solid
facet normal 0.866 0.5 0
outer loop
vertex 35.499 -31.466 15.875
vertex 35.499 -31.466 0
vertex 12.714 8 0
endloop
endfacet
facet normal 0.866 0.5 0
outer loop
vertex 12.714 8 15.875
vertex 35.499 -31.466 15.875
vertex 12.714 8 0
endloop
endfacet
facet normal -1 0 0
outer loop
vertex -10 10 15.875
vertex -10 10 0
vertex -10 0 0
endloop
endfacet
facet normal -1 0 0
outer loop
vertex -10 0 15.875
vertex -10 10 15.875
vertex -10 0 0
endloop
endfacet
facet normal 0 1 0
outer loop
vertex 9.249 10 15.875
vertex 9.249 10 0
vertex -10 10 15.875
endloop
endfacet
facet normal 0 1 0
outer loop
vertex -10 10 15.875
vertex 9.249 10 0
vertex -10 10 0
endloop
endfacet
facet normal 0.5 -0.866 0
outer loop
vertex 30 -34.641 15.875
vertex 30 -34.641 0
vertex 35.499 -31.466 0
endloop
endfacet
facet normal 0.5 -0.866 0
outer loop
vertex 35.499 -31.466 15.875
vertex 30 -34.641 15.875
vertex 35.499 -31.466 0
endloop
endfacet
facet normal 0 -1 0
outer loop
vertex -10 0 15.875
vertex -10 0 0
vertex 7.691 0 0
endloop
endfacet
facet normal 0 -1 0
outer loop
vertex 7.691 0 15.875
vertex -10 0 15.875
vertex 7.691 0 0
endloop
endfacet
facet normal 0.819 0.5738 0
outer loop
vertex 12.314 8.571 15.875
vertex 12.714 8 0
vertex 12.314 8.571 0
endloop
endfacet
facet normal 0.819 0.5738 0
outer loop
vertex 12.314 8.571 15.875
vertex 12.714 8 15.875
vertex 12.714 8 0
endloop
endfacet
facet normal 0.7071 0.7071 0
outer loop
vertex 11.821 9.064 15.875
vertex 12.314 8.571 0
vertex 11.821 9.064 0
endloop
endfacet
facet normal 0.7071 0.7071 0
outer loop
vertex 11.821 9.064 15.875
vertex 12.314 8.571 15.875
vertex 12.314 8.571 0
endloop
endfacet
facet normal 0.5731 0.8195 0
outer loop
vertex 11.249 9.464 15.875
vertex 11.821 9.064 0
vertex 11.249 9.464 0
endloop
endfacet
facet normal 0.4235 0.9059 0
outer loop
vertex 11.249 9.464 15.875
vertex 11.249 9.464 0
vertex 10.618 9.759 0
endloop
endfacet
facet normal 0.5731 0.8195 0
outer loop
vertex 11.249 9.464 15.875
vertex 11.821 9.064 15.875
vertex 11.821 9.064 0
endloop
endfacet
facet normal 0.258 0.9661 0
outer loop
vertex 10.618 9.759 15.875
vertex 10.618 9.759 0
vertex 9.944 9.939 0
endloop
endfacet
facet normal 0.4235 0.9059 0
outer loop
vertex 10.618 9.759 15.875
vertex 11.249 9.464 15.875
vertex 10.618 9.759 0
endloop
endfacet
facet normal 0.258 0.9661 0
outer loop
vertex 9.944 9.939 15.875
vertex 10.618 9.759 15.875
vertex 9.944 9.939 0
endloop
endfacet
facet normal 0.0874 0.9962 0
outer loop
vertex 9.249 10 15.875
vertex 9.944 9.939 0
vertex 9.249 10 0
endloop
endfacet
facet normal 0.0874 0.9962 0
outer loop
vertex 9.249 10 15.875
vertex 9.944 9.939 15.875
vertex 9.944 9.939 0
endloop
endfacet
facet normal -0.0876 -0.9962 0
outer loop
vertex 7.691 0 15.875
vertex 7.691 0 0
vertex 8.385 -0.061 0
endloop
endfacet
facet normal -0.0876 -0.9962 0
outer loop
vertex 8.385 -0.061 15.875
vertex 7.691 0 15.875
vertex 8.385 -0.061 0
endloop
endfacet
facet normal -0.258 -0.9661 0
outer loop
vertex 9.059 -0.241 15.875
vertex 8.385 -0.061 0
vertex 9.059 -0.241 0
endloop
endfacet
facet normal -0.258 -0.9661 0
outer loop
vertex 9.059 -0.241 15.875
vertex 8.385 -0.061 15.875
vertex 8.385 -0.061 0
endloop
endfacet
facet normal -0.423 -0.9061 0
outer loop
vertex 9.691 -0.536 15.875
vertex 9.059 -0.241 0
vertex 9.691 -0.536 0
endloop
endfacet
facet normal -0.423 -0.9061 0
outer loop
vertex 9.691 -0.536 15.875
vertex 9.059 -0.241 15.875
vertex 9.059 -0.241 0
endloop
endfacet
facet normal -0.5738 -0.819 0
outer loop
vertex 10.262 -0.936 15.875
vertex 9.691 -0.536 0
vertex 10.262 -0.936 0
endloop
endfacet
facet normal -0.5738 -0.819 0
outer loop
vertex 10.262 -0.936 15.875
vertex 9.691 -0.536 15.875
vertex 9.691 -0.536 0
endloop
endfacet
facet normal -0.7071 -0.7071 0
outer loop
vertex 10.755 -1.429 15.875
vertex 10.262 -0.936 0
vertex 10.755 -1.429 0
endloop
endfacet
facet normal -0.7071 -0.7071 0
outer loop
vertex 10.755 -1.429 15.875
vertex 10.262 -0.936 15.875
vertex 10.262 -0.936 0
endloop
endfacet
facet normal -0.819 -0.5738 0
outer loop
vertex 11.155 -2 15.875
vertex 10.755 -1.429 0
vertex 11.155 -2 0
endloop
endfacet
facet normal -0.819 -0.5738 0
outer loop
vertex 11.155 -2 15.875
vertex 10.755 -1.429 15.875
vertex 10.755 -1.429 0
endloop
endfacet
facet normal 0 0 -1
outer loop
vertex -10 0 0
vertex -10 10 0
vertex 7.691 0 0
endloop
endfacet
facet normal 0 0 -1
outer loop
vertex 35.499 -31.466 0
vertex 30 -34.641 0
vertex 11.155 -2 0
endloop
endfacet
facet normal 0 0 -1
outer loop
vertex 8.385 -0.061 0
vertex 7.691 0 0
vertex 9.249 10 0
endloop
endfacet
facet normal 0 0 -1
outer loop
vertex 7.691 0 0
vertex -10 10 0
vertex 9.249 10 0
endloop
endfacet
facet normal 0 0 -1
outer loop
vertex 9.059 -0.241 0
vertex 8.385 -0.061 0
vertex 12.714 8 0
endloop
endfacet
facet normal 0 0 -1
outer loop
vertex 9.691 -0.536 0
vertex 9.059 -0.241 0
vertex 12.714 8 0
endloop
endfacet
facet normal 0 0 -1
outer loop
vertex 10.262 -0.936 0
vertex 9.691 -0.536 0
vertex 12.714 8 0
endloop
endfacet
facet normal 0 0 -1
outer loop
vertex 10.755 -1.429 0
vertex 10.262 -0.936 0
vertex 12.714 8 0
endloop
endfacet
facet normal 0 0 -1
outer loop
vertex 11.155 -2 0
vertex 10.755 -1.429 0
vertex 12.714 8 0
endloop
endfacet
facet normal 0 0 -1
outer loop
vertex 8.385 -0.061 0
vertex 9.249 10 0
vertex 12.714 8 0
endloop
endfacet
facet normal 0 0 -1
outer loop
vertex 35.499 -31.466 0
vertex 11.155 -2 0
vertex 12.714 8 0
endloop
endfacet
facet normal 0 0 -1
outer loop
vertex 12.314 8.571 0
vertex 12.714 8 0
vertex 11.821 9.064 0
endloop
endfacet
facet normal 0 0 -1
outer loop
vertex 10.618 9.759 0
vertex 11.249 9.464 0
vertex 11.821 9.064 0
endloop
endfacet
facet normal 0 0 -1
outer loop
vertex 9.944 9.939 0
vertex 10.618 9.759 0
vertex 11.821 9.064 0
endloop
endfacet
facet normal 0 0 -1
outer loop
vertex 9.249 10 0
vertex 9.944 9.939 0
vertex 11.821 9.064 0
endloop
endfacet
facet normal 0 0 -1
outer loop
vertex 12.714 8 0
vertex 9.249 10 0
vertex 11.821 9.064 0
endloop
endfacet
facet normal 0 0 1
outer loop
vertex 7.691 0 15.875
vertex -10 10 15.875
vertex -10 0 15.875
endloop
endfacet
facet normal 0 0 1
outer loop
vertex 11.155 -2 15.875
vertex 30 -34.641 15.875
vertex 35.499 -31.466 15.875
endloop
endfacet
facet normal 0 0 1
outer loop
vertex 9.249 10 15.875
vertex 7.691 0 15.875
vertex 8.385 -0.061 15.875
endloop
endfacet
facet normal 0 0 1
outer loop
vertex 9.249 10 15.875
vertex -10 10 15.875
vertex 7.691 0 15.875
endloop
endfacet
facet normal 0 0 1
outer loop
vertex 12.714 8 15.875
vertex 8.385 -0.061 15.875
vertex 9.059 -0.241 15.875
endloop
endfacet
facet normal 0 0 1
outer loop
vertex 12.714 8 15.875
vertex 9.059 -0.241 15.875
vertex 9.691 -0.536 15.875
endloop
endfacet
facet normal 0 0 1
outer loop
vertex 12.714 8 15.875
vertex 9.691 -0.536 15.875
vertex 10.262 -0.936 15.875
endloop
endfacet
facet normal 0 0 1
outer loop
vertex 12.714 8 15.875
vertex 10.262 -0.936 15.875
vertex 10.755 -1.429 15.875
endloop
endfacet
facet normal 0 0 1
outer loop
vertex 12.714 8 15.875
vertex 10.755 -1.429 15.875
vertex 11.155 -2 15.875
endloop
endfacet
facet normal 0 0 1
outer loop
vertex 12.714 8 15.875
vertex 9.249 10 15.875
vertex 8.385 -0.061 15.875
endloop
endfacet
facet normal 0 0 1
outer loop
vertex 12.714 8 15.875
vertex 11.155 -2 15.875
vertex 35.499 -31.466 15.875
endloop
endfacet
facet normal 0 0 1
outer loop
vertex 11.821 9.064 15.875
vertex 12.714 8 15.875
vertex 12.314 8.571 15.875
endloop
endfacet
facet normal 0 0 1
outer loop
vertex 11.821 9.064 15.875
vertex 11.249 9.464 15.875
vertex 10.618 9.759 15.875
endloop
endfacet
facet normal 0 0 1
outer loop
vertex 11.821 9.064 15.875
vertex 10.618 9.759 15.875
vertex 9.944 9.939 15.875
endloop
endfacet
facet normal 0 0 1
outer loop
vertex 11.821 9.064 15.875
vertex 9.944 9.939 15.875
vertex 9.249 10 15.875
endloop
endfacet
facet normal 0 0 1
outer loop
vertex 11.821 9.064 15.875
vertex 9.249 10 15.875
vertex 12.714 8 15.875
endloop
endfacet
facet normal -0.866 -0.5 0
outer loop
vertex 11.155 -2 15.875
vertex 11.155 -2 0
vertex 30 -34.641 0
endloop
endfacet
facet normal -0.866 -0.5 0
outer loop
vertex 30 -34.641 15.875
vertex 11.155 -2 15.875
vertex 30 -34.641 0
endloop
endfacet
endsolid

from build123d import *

# Parameters (mm, degrees)
BOSS_EXTRUDE1_DEPTH = 15.875
FILLET1_R           = 4


with BuildPart() as part:
    # Sketch1 → Boss-Extrude1 (new body)
    with BuildSketch(Plane.XY):
        Polygon((-10, 0), (10, 0), (30, -34.641016151), (35.499261314, -31.466016151), (11.558845727, 10), (-10, 10), align=None)
    extrude(amount=BOSS_EXTRUDE1_DEPTH)

    # Fillet1
    fillet1_edges = [part.edges().sort_by_distance(p)[0] for p in [
        (11.558845727, 10, 7.9375),
        (10, 0, 7.9375),
    ]]
    fillet(fillet1_edges, radius=FILLET1_R)


solid = part.part
